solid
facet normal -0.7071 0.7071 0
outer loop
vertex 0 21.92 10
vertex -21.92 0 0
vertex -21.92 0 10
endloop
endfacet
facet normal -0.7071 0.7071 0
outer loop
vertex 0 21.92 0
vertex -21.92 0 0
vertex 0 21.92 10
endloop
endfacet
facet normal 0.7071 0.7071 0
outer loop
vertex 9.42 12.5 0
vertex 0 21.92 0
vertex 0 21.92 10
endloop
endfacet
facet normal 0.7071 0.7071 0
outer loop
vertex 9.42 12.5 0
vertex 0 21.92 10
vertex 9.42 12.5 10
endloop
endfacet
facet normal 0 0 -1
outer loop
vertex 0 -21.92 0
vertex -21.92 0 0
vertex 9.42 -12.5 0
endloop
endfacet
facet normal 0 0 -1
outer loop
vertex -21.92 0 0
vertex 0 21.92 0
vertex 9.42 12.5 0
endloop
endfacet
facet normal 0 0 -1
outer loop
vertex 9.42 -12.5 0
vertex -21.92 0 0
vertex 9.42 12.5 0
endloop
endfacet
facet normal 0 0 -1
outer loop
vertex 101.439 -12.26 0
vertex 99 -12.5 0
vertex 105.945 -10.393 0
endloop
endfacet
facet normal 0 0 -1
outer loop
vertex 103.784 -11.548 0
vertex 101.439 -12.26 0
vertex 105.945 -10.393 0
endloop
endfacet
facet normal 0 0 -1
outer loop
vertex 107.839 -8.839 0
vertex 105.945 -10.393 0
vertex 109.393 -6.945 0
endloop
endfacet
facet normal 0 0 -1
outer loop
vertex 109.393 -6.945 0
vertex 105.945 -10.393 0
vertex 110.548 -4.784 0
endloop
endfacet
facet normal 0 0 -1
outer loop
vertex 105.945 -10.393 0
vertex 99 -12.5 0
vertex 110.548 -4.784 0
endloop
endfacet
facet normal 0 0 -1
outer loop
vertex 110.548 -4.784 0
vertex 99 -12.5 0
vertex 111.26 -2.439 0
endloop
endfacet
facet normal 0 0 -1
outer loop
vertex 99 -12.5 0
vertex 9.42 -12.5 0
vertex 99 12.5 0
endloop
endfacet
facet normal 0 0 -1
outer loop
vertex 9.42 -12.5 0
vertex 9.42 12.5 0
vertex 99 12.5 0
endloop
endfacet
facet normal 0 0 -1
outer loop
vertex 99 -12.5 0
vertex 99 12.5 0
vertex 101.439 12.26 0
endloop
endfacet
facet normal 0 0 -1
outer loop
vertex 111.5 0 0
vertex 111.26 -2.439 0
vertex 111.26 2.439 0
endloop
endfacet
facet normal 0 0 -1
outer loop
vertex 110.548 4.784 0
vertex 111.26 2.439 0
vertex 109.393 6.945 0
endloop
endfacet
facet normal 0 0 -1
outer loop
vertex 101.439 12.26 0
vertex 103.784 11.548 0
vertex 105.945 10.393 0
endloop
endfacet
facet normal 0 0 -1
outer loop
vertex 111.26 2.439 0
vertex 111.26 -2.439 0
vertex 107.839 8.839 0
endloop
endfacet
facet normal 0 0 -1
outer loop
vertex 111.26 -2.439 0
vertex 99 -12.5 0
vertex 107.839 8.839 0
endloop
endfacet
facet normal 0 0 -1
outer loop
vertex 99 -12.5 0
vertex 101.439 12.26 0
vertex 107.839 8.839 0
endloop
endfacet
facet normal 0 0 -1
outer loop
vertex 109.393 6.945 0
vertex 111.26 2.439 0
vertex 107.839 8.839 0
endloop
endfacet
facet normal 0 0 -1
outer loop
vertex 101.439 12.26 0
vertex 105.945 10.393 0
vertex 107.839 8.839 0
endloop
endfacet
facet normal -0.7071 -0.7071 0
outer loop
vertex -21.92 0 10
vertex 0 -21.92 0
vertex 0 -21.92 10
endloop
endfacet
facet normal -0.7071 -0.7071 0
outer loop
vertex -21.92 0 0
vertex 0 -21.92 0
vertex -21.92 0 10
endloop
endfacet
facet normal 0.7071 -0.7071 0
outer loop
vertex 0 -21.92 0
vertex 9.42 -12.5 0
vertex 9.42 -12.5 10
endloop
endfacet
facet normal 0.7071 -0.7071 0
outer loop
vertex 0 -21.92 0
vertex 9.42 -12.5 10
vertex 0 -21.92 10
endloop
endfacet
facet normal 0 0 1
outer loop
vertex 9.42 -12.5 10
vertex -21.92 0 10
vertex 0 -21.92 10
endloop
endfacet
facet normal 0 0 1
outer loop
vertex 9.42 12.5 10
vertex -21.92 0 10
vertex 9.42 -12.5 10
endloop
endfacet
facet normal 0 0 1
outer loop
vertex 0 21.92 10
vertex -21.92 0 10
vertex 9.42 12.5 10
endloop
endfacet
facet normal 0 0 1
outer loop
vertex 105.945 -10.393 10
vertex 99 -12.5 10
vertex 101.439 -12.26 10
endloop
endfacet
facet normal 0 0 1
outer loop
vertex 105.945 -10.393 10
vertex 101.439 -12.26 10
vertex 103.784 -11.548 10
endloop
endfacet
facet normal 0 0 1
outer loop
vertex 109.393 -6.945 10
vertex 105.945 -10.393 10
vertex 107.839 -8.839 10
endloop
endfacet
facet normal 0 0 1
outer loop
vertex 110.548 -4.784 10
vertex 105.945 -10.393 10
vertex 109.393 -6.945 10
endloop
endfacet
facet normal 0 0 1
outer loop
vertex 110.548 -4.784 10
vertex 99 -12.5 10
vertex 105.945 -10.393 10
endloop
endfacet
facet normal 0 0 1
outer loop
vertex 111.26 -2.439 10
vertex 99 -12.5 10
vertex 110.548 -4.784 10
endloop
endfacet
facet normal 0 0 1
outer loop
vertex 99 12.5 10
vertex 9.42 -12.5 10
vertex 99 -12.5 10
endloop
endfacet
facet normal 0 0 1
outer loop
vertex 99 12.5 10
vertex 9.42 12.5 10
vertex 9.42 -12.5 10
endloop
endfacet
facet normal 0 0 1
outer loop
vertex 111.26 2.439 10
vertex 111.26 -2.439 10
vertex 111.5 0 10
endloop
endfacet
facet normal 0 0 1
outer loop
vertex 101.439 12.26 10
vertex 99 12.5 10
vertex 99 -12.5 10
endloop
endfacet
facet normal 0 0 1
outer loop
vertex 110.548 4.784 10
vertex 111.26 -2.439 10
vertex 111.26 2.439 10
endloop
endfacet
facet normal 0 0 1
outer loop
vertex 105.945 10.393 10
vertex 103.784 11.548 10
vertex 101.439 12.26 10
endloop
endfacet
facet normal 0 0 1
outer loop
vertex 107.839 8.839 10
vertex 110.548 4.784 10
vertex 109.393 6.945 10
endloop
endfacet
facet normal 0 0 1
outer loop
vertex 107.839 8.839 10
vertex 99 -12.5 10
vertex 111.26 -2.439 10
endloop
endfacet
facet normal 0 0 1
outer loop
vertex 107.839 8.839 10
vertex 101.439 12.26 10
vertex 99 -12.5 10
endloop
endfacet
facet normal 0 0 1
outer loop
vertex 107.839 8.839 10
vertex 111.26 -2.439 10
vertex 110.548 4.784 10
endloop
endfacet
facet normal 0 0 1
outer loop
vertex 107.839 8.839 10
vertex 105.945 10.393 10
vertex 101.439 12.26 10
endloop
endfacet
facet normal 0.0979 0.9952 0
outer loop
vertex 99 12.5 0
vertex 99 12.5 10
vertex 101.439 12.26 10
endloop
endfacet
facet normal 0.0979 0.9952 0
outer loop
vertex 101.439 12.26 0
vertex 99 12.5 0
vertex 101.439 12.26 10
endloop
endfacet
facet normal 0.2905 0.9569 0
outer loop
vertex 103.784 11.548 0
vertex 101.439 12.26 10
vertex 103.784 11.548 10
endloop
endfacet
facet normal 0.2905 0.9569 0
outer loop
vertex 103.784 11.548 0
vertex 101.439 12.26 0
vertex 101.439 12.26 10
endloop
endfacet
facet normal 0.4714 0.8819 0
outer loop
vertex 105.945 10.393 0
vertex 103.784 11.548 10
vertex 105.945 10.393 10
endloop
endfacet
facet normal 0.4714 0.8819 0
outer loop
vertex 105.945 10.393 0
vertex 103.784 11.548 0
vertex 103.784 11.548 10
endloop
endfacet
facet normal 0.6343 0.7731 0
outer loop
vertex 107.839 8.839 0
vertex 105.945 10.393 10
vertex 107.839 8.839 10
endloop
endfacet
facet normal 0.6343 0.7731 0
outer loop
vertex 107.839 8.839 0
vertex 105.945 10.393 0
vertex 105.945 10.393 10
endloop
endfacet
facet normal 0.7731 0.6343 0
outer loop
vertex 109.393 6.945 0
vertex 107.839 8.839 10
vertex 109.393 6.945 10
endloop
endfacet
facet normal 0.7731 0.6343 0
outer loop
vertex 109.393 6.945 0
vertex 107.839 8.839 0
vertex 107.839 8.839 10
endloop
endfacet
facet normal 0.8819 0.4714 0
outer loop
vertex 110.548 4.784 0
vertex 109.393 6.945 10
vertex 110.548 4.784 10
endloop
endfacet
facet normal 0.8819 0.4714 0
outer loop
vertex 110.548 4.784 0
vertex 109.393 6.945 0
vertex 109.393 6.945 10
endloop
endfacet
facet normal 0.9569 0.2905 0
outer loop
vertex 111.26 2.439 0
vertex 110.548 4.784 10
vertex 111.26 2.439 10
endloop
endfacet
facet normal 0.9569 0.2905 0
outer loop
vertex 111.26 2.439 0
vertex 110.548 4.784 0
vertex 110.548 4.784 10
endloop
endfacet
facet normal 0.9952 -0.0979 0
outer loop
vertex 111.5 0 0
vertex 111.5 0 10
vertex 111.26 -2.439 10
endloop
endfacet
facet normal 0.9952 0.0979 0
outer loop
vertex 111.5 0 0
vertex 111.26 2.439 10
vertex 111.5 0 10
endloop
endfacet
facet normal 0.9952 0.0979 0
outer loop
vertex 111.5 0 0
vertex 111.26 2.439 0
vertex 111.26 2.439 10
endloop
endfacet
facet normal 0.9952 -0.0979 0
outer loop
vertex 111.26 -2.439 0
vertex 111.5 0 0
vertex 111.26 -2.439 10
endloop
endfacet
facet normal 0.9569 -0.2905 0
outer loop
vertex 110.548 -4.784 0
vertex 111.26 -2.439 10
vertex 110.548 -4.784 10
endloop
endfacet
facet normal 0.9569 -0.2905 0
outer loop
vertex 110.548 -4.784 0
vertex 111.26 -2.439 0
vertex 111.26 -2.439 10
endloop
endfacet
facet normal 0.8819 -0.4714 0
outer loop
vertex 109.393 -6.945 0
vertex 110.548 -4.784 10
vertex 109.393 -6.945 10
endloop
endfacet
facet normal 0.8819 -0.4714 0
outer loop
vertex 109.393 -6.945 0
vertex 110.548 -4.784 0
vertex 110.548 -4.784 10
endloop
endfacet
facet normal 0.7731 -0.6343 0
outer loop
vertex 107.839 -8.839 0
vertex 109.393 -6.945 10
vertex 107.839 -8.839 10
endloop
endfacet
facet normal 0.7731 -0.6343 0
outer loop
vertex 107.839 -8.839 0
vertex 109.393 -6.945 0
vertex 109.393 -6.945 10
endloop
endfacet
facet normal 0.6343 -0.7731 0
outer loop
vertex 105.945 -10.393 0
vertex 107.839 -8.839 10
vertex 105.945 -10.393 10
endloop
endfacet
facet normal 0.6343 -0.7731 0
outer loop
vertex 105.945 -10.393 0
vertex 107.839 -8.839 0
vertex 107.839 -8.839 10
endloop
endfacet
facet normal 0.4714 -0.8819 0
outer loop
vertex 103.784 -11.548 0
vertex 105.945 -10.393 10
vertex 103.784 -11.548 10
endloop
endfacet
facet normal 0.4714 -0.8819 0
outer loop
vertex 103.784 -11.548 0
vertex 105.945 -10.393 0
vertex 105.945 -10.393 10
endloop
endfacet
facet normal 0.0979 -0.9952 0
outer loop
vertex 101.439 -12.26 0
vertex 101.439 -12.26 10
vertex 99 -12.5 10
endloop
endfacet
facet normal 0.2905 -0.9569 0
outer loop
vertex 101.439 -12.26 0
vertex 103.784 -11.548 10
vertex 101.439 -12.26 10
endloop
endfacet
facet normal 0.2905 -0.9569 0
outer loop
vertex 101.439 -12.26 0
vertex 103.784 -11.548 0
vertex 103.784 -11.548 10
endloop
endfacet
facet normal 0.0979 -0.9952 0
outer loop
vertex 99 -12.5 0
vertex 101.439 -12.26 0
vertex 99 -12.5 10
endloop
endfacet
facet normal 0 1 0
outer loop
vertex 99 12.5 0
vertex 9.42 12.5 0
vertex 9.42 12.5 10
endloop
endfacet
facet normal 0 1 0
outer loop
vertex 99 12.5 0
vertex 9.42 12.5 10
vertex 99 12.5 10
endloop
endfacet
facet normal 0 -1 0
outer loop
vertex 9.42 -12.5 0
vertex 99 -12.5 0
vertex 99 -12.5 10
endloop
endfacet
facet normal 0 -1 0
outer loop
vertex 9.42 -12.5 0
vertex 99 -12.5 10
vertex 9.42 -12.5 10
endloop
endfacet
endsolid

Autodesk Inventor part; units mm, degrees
ref_plane "YZ Plane" through (0, 0, 0) normal (1, 0, 0) x (0, 1, 0)
ref_plane "XZ Plane" through (0, 0, 0) normal (0, 1, 0) x (-1, 0, 0)
ref_plane "XY Plane" through (0, 0, 0) normal (0, 0, 1) x (1, 0, 0)
sketch "Sketch1" plane through (0, 0, 0) normal (0, 0, 1) x (1, 0, 0)
  line L0 (0, 21.9203) -> (21.9203, 0)
  line L1 (21.9203, 0) -> (0, -21.9203)
  line L2 (0, -21.9203) -> (-21.9203, 0)
  line L3 (-21.9203, 0) -> (0, 21.9203)
  line L4 (0, 12.5) -> (99, 12.5)
  arc A0 (99, -12.5) -> (99, 12.5) centre (99, 0) ccw
  line L5 (99, -12.5) -> (0, -12.5)
  line L6 (0, -12.5) -> (0, 12.5)
  point P0 (0, 0)
  point P1 (0, 0)
  point P2 (0, 0)
  dimension "d0" = 31
  dimension "d1" = 99
  dimension "d2" = 25
extrude "Extrusion1" add sketch "Sketch1" along normal blind 10
properties part number "layout aide"
